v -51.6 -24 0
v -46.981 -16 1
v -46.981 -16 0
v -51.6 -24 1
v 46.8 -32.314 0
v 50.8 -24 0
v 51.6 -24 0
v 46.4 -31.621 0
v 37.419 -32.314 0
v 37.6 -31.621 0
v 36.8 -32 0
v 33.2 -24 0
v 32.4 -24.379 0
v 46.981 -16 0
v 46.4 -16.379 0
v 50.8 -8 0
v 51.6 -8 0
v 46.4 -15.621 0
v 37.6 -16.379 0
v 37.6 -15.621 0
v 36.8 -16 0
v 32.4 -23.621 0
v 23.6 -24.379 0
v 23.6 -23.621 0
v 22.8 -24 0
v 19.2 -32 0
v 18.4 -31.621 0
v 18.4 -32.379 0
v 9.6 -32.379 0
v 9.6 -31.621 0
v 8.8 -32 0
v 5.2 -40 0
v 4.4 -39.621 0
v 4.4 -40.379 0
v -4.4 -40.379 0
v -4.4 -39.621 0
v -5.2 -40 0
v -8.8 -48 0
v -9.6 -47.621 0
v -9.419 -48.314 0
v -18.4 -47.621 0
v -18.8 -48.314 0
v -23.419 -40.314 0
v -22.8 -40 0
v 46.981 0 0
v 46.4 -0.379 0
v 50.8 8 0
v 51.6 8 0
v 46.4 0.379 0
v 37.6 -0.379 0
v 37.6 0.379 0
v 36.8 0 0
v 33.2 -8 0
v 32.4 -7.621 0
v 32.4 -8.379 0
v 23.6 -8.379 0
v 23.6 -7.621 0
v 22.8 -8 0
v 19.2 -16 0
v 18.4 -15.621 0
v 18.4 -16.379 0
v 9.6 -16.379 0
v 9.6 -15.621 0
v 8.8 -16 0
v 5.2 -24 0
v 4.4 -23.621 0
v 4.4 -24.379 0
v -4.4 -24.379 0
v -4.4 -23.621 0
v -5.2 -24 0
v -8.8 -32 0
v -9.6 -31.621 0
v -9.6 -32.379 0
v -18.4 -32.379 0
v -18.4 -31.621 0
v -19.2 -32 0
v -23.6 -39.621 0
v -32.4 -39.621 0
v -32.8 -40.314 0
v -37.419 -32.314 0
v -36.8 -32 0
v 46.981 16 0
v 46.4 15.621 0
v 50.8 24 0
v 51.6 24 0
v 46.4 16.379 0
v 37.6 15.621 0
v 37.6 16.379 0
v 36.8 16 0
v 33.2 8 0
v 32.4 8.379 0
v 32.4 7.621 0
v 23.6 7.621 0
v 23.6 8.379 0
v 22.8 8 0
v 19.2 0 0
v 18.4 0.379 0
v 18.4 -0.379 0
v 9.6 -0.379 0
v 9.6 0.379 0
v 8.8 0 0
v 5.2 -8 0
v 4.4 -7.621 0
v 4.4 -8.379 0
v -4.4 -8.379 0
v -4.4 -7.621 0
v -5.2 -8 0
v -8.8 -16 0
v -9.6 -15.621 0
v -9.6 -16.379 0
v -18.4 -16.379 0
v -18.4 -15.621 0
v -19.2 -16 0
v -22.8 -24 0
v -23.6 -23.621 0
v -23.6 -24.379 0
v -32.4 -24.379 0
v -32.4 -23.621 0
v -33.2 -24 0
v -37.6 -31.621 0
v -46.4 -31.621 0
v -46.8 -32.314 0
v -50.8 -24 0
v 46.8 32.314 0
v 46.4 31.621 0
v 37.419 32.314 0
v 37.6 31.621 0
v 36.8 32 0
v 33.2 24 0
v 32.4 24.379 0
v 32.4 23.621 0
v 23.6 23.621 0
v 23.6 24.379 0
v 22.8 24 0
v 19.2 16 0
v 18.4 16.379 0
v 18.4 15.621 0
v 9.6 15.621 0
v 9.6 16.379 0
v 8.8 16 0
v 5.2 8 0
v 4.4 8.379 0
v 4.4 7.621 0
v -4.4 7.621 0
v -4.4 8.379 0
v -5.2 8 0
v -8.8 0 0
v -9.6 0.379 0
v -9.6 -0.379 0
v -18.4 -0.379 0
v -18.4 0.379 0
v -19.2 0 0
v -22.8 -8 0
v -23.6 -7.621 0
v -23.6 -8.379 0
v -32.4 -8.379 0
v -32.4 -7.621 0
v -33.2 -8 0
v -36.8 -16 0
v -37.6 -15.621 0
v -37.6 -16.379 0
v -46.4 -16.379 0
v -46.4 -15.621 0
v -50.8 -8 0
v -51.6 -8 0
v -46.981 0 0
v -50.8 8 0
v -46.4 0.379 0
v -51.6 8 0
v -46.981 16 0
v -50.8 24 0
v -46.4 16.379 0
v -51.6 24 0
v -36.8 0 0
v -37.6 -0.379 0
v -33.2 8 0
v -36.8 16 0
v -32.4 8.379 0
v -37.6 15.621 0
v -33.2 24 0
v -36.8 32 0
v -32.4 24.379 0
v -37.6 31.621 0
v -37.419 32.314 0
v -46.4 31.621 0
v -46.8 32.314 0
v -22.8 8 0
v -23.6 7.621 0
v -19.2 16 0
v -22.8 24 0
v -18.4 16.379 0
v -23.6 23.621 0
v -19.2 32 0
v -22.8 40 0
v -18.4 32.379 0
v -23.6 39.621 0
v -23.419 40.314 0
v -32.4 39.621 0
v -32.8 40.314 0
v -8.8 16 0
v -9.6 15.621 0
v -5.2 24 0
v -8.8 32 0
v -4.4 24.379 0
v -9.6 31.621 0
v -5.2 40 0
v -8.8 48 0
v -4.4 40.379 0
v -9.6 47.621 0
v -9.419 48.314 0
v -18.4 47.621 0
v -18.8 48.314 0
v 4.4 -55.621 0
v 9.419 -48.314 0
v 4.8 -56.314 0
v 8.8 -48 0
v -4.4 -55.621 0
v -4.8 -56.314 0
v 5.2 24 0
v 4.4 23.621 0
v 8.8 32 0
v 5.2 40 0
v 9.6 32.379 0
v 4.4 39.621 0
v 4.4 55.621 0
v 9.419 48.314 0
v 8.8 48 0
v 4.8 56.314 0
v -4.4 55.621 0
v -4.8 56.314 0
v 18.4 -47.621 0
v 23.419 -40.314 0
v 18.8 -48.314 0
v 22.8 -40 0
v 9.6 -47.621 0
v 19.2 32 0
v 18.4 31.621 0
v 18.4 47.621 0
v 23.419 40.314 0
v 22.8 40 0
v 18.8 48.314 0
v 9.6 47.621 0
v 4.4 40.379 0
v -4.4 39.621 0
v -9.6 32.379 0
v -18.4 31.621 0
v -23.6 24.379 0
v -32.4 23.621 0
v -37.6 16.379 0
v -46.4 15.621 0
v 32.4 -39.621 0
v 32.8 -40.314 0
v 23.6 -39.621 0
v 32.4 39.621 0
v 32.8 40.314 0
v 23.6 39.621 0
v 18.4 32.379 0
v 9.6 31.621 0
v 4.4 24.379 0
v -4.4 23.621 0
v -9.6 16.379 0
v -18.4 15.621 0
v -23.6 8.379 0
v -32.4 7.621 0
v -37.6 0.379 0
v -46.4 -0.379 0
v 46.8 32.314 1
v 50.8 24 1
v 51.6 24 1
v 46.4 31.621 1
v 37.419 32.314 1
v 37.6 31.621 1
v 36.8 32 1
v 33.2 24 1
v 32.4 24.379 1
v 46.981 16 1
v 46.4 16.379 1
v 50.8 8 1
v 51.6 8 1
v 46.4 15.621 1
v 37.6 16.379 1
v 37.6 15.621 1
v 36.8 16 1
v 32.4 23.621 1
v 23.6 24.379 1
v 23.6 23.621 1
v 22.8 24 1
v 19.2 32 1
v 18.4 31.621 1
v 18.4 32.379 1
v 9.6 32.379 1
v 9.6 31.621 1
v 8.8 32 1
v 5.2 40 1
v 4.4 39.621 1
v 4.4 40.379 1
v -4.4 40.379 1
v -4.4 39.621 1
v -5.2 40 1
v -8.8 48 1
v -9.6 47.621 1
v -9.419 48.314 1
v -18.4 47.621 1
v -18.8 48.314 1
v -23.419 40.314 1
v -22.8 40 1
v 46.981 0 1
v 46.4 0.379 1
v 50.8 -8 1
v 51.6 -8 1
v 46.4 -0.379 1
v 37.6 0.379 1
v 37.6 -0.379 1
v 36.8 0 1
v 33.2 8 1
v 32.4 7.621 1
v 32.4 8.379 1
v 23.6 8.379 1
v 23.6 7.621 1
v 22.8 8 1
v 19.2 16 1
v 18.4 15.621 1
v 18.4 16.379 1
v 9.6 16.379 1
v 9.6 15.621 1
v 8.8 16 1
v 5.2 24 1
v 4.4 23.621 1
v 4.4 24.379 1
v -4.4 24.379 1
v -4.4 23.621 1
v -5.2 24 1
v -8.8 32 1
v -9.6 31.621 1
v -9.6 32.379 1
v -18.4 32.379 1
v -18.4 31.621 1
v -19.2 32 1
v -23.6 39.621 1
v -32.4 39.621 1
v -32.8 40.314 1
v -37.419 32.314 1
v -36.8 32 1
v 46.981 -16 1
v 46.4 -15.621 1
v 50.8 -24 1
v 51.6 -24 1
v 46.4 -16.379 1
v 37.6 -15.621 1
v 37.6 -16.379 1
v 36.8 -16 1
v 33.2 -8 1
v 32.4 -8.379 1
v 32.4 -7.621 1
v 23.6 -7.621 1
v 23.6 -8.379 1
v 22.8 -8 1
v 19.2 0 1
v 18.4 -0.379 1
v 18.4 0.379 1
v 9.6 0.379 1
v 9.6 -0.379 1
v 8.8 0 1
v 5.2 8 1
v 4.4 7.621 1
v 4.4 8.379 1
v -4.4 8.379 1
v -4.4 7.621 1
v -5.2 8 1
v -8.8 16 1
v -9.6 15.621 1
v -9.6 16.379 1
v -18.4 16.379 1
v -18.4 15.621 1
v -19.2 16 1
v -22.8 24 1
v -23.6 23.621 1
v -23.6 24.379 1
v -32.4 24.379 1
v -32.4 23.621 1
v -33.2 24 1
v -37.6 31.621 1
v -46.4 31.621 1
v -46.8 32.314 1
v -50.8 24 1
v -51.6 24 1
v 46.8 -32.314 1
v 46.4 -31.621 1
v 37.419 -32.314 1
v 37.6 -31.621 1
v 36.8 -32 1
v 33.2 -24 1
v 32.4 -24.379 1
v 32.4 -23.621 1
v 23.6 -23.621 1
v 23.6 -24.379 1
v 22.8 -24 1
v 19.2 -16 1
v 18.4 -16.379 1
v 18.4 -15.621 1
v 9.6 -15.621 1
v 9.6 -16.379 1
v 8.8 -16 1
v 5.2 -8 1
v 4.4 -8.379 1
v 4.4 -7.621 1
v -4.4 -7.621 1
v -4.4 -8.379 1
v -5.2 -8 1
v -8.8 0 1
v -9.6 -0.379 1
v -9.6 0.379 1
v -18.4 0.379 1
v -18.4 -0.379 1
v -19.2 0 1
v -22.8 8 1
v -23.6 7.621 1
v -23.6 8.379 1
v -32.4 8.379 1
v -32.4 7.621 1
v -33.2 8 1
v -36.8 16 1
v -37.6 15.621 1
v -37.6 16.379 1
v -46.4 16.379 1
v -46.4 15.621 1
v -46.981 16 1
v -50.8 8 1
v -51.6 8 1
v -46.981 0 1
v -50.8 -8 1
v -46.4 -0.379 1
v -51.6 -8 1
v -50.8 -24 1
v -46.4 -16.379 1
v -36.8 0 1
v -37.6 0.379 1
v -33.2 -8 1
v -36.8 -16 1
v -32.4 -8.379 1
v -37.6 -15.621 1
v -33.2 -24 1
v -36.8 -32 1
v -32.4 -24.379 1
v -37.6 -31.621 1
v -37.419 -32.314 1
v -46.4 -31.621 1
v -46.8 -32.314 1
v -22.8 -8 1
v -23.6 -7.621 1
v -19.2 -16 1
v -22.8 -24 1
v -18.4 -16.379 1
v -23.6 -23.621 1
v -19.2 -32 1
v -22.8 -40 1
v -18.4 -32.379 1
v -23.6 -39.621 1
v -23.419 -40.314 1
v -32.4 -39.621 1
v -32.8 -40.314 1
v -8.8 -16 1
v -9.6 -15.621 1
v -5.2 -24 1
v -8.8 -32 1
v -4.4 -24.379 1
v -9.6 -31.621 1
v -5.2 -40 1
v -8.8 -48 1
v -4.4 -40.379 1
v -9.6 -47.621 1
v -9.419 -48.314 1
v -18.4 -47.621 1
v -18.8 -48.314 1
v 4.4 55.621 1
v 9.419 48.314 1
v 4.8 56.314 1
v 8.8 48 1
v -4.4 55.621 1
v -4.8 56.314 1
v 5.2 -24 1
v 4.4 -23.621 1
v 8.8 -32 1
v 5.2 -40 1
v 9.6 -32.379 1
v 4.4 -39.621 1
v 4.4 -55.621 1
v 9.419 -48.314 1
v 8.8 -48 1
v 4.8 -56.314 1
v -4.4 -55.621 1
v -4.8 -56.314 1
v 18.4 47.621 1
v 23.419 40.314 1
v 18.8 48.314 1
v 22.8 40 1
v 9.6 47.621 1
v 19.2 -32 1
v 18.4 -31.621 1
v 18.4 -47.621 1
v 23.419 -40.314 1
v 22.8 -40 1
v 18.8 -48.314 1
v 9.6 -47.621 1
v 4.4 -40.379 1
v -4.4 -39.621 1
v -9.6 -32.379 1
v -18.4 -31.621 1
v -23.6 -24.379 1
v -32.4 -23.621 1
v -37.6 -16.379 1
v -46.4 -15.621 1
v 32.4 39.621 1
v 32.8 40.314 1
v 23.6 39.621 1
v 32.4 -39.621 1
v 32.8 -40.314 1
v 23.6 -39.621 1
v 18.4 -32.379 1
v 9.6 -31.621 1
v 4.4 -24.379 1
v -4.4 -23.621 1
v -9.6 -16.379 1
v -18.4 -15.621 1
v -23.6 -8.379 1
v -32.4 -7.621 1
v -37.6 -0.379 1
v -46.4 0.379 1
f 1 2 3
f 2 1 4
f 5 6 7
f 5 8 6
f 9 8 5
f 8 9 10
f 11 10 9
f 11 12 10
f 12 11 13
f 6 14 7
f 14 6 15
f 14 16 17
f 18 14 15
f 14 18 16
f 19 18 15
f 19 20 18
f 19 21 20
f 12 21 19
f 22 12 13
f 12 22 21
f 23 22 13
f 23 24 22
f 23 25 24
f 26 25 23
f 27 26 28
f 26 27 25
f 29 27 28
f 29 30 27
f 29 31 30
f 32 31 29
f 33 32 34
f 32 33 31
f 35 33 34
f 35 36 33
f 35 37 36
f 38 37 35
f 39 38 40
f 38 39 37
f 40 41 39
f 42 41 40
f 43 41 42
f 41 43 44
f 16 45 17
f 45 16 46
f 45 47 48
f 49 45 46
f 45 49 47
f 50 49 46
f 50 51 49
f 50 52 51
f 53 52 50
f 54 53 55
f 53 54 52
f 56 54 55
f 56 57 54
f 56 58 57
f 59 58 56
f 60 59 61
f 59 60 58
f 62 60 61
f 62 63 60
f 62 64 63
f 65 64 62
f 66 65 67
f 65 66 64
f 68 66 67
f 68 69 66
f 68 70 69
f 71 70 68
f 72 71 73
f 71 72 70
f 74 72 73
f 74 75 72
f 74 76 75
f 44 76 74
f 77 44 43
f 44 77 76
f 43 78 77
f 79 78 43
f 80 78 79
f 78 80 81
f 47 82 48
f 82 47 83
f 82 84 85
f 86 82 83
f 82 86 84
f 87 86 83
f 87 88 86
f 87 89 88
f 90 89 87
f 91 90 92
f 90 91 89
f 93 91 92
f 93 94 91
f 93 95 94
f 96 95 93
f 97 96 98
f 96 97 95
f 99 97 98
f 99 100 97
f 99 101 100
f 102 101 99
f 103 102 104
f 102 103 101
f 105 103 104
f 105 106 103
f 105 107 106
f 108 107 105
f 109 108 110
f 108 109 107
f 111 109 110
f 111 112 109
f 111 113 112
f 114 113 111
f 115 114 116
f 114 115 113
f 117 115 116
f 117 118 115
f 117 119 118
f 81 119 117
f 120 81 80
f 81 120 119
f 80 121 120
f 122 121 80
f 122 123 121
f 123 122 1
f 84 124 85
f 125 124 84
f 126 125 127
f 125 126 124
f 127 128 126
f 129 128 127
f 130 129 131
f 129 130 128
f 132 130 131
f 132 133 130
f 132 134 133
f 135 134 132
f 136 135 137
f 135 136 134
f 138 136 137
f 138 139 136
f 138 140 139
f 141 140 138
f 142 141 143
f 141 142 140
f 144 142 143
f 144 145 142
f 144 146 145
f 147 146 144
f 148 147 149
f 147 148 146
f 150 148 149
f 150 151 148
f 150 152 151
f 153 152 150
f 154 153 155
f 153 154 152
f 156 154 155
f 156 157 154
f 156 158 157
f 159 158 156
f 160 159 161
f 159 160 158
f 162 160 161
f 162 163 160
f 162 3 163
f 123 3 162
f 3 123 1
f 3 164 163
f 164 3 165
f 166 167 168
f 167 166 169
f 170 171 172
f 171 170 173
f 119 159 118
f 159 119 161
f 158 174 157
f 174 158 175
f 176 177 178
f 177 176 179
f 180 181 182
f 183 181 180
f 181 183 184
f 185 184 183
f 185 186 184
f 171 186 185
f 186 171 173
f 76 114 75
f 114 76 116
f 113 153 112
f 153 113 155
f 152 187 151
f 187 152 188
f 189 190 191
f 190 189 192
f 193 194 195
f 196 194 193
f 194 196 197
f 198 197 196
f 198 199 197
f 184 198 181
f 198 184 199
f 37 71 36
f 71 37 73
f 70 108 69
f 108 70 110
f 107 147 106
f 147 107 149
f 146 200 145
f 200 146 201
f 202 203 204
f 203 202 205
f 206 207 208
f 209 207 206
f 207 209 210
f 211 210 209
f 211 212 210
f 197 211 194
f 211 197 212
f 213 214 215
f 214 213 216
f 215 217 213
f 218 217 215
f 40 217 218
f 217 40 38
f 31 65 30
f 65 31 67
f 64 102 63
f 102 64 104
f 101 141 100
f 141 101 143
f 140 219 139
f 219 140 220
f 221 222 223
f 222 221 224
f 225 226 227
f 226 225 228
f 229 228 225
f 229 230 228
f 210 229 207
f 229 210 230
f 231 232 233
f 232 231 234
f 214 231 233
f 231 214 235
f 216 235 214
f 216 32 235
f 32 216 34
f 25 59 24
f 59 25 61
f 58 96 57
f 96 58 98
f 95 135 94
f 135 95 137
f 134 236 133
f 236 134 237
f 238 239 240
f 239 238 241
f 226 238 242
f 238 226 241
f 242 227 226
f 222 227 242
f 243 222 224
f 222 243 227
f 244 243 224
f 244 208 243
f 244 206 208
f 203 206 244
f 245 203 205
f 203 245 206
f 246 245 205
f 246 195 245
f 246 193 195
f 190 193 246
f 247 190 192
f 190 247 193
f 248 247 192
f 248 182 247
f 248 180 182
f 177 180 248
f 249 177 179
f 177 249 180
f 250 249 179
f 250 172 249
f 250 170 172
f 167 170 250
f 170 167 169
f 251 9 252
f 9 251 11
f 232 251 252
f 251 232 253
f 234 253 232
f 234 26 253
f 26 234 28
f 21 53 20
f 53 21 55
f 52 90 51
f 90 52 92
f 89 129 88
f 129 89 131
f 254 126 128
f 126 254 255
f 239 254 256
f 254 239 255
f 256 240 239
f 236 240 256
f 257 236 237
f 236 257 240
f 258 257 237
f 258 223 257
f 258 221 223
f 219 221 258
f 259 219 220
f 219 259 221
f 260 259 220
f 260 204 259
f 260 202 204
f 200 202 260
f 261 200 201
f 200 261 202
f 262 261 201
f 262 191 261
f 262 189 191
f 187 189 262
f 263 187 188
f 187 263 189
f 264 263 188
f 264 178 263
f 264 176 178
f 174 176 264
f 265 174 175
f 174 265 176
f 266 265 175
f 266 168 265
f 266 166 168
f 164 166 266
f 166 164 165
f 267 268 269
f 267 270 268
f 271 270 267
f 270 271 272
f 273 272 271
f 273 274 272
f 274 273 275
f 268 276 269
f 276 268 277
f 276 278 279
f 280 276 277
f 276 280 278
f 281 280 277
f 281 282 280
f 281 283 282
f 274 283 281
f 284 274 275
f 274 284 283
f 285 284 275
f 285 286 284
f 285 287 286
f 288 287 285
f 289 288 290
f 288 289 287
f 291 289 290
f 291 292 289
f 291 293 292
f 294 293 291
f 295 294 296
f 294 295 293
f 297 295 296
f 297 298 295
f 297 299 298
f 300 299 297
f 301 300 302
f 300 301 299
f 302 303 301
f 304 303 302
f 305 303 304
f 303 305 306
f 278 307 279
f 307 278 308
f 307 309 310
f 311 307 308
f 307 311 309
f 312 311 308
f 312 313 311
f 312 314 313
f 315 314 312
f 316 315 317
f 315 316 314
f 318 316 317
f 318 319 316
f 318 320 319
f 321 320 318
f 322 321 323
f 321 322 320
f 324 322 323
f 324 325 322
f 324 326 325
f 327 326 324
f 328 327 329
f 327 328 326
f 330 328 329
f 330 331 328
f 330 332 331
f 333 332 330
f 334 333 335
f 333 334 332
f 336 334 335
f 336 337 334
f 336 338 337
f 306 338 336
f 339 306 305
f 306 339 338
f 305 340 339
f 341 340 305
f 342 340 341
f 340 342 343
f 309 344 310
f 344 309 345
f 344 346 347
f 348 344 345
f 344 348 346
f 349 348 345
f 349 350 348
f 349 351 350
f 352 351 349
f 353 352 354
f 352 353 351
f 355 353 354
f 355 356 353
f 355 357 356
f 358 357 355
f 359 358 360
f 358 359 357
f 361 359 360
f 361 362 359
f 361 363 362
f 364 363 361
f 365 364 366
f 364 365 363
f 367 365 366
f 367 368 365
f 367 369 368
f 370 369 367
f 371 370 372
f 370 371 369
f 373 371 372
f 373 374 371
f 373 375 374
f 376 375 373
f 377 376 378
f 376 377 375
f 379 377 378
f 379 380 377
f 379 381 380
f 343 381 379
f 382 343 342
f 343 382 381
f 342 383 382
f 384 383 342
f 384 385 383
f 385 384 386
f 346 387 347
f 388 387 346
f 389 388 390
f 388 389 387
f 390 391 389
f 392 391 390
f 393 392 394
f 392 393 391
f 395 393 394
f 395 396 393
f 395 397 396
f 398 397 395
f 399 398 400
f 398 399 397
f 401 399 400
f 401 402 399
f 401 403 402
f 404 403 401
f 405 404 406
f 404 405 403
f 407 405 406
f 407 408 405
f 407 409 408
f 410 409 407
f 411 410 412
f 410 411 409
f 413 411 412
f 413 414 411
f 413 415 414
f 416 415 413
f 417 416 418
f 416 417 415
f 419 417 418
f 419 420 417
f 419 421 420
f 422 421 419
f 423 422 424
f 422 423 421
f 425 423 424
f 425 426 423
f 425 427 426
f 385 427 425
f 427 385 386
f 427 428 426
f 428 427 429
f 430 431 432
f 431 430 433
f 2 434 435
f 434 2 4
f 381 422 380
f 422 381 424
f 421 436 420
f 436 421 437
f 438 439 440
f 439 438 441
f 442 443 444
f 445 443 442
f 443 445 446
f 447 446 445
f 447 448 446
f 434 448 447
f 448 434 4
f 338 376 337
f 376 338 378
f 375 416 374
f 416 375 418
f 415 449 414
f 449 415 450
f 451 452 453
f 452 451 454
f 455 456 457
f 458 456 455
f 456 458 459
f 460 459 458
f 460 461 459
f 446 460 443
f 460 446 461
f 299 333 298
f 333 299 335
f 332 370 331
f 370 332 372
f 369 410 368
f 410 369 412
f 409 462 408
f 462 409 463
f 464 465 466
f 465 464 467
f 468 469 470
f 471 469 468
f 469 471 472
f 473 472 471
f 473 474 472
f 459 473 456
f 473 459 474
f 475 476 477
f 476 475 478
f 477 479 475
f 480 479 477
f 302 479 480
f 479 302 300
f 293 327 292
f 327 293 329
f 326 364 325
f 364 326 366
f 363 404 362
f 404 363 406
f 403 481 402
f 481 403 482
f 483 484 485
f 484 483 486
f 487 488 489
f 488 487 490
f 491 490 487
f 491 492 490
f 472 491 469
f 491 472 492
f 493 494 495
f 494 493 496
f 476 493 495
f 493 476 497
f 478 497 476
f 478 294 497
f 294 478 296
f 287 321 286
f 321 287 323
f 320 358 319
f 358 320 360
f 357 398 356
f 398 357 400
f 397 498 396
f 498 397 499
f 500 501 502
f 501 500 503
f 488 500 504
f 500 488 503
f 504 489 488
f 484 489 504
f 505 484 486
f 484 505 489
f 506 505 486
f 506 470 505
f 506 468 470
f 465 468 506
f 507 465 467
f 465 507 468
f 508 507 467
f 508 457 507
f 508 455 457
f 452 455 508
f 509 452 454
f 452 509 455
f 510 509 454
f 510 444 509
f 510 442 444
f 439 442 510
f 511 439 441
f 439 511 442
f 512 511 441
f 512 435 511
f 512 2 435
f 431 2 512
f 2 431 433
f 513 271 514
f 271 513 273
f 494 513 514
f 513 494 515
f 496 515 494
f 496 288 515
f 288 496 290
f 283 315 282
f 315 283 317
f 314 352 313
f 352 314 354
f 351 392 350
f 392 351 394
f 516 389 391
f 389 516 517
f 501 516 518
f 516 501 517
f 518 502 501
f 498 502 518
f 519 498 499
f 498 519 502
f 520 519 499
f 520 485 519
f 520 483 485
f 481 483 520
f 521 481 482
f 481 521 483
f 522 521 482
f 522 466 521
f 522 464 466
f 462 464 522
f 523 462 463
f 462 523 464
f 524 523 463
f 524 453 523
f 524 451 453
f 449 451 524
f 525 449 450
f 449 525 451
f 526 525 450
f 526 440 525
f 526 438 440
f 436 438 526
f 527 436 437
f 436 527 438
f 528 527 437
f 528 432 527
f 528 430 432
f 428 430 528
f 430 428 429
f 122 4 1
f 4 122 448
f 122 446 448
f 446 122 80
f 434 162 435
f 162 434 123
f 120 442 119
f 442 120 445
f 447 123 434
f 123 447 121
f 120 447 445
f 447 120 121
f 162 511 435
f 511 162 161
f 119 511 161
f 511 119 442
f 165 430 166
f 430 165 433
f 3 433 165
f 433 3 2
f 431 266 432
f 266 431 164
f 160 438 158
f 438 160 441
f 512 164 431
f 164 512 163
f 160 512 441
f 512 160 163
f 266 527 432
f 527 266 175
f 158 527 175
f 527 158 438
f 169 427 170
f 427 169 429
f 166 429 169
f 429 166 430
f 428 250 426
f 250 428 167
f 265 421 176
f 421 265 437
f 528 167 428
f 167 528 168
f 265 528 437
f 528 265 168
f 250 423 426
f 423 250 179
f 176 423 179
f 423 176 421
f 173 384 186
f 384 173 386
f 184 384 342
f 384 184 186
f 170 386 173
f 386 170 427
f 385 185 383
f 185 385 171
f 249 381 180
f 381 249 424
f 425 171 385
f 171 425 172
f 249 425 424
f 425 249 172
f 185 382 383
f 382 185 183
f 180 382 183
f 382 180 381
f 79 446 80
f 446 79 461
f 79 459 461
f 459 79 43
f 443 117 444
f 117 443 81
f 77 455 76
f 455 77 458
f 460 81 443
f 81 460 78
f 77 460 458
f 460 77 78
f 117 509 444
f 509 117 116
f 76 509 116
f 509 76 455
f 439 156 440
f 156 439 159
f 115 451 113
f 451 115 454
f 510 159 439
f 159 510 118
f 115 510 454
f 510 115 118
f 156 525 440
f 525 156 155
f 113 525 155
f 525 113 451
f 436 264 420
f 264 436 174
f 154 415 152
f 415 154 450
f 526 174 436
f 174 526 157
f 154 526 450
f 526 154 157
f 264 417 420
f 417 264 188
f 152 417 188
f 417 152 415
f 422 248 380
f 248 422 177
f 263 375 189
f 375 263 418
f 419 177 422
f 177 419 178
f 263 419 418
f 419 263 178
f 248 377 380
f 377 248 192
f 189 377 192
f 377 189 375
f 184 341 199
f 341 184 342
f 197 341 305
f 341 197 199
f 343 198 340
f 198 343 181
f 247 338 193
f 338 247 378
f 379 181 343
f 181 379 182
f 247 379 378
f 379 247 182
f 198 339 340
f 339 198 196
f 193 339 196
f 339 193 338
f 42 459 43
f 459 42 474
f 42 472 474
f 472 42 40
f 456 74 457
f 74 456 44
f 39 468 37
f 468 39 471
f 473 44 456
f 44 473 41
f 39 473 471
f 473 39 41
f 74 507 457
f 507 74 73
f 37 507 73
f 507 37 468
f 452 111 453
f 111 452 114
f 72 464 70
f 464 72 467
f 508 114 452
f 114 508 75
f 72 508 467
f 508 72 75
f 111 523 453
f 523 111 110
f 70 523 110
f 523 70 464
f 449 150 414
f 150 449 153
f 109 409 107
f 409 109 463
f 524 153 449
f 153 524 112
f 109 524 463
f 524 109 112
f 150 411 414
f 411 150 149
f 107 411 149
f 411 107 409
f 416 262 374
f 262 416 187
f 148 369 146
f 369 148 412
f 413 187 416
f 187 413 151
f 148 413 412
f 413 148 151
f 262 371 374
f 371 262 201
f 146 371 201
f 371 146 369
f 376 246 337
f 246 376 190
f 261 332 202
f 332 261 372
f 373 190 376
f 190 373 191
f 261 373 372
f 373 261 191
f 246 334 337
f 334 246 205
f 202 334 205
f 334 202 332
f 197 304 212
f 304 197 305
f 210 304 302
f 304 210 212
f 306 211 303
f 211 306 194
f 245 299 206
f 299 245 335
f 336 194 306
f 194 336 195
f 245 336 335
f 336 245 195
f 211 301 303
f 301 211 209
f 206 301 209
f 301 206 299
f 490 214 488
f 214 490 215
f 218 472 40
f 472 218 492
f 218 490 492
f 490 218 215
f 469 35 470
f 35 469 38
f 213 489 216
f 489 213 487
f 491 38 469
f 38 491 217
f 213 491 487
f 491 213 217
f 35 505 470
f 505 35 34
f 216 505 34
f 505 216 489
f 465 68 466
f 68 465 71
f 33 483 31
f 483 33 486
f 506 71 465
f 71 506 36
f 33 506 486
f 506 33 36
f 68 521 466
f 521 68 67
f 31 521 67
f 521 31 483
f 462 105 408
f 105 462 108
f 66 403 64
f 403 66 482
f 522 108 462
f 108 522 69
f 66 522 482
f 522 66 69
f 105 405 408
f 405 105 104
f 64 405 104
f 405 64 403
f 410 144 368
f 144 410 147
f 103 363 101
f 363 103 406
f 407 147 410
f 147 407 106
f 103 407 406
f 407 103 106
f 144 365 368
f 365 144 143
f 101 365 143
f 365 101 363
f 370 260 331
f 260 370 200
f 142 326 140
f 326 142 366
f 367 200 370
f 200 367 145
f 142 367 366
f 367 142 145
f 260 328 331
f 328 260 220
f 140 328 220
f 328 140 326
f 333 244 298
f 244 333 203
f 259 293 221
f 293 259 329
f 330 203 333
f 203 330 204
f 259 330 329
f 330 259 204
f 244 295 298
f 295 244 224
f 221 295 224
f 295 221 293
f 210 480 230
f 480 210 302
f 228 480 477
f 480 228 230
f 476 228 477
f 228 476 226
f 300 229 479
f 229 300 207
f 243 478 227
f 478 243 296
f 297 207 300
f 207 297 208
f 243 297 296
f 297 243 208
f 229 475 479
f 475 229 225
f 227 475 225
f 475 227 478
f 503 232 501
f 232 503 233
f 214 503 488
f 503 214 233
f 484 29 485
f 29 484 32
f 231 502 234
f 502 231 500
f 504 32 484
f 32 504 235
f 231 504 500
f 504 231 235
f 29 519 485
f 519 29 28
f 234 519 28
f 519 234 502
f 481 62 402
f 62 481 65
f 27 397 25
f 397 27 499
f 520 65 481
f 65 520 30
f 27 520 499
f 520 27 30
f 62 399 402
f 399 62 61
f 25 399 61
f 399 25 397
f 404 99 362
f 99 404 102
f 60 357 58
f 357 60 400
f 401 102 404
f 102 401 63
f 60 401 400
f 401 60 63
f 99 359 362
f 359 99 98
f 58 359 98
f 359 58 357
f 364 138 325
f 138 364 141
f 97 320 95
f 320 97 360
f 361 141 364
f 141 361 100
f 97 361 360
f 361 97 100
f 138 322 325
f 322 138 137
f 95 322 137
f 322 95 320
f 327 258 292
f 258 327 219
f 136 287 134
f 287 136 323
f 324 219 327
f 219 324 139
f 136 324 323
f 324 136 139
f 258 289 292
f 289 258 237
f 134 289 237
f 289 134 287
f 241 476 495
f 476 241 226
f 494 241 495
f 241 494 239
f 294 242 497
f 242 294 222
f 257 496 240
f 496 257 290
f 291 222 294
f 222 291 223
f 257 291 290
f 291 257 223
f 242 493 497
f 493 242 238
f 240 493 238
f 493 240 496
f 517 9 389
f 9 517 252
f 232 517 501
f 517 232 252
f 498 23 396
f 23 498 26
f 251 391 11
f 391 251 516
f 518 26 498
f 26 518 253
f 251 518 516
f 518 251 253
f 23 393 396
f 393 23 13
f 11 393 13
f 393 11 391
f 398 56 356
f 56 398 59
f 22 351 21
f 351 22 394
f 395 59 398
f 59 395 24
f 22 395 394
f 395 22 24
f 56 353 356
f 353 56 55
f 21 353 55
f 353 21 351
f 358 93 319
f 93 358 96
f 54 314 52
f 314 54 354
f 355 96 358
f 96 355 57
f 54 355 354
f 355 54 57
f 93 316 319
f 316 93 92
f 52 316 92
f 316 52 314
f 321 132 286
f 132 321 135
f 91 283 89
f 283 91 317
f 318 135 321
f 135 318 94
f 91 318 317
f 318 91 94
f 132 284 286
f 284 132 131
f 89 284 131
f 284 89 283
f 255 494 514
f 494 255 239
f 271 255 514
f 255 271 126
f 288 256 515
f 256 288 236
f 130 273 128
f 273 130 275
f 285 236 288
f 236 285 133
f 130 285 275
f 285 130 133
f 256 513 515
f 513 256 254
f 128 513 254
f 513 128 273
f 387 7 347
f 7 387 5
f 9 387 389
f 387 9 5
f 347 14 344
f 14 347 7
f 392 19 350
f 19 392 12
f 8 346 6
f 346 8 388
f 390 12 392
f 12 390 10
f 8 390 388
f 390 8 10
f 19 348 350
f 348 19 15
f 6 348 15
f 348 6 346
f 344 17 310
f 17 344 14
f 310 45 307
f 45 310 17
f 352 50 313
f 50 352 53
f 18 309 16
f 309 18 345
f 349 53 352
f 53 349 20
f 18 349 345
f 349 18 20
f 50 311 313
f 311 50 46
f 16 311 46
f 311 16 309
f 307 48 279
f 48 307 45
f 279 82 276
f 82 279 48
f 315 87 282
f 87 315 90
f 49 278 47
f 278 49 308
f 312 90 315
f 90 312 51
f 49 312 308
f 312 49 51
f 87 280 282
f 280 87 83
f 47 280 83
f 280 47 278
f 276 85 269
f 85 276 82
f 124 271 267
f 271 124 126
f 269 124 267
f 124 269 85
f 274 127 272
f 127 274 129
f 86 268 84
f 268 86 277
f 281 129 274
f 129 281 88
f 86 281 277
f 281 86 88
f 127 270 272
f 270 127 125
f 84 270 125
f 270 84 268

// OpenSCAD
// Cell Radius
cell_radius = 8; //[5:100]
// Honeycomb Radius (hexes from center to outside of holder)
honeycomb_radius = 3; //[2:5]
// Floor Thickness
floor_thickness = 0; //[0:5]
// Height (Base height; may be adjusted by rounded top)
height = 1; //[1:150]

module hexagon(radius){
	circle(r=radius,$fn=6);
}

module cell(radius, height, floor_thickness){
	difference(){
		linear_extrude(height=height){hexagon(radius*1.2);} // base
		translate([0,0,floor_thickness]) linear_extrude(height=height){hexagon(radius*1.1);} // hole
	}
}

module translate_to_hex(x_coord, y_coord, hex_width){
	x = x_coord*hex_width*1.75;
	y = (2*y_coord*hex_width)+(x_coord*hex_width);
	translate([x, y, 0]){
		child(0);
	}
}

module rounded_cap(radius, hex_width, height){
	difference(){
		translate([0,0,height]) cylinder(r=3*hex_width*radius,h=height,center=true);
		translate([0,0,height/2]) scale([1,1,1/radius]) sphere(r=3*hex_width*radius,center=true);
	}
}

module pencil_holder(radius, hex_width, height, floor_thickness){
	difference(){
		union(){
			for(x = [-radius:radius]){
				for(y = [-radius:radius]){
					assign(z=0-x-y){
						if(max(abs(x),abs(y),abs(z))<=radius){
							translate_to_hex(x, y, hex_width) cell(hex_width, height, floor_thickness);
						}
					}
				}
			}
		}
		rounded_cap(radius, hex_width, height);
	}
}

pencil_holder(honeycomb_radius, cell_radius, height, floor_thickness);
